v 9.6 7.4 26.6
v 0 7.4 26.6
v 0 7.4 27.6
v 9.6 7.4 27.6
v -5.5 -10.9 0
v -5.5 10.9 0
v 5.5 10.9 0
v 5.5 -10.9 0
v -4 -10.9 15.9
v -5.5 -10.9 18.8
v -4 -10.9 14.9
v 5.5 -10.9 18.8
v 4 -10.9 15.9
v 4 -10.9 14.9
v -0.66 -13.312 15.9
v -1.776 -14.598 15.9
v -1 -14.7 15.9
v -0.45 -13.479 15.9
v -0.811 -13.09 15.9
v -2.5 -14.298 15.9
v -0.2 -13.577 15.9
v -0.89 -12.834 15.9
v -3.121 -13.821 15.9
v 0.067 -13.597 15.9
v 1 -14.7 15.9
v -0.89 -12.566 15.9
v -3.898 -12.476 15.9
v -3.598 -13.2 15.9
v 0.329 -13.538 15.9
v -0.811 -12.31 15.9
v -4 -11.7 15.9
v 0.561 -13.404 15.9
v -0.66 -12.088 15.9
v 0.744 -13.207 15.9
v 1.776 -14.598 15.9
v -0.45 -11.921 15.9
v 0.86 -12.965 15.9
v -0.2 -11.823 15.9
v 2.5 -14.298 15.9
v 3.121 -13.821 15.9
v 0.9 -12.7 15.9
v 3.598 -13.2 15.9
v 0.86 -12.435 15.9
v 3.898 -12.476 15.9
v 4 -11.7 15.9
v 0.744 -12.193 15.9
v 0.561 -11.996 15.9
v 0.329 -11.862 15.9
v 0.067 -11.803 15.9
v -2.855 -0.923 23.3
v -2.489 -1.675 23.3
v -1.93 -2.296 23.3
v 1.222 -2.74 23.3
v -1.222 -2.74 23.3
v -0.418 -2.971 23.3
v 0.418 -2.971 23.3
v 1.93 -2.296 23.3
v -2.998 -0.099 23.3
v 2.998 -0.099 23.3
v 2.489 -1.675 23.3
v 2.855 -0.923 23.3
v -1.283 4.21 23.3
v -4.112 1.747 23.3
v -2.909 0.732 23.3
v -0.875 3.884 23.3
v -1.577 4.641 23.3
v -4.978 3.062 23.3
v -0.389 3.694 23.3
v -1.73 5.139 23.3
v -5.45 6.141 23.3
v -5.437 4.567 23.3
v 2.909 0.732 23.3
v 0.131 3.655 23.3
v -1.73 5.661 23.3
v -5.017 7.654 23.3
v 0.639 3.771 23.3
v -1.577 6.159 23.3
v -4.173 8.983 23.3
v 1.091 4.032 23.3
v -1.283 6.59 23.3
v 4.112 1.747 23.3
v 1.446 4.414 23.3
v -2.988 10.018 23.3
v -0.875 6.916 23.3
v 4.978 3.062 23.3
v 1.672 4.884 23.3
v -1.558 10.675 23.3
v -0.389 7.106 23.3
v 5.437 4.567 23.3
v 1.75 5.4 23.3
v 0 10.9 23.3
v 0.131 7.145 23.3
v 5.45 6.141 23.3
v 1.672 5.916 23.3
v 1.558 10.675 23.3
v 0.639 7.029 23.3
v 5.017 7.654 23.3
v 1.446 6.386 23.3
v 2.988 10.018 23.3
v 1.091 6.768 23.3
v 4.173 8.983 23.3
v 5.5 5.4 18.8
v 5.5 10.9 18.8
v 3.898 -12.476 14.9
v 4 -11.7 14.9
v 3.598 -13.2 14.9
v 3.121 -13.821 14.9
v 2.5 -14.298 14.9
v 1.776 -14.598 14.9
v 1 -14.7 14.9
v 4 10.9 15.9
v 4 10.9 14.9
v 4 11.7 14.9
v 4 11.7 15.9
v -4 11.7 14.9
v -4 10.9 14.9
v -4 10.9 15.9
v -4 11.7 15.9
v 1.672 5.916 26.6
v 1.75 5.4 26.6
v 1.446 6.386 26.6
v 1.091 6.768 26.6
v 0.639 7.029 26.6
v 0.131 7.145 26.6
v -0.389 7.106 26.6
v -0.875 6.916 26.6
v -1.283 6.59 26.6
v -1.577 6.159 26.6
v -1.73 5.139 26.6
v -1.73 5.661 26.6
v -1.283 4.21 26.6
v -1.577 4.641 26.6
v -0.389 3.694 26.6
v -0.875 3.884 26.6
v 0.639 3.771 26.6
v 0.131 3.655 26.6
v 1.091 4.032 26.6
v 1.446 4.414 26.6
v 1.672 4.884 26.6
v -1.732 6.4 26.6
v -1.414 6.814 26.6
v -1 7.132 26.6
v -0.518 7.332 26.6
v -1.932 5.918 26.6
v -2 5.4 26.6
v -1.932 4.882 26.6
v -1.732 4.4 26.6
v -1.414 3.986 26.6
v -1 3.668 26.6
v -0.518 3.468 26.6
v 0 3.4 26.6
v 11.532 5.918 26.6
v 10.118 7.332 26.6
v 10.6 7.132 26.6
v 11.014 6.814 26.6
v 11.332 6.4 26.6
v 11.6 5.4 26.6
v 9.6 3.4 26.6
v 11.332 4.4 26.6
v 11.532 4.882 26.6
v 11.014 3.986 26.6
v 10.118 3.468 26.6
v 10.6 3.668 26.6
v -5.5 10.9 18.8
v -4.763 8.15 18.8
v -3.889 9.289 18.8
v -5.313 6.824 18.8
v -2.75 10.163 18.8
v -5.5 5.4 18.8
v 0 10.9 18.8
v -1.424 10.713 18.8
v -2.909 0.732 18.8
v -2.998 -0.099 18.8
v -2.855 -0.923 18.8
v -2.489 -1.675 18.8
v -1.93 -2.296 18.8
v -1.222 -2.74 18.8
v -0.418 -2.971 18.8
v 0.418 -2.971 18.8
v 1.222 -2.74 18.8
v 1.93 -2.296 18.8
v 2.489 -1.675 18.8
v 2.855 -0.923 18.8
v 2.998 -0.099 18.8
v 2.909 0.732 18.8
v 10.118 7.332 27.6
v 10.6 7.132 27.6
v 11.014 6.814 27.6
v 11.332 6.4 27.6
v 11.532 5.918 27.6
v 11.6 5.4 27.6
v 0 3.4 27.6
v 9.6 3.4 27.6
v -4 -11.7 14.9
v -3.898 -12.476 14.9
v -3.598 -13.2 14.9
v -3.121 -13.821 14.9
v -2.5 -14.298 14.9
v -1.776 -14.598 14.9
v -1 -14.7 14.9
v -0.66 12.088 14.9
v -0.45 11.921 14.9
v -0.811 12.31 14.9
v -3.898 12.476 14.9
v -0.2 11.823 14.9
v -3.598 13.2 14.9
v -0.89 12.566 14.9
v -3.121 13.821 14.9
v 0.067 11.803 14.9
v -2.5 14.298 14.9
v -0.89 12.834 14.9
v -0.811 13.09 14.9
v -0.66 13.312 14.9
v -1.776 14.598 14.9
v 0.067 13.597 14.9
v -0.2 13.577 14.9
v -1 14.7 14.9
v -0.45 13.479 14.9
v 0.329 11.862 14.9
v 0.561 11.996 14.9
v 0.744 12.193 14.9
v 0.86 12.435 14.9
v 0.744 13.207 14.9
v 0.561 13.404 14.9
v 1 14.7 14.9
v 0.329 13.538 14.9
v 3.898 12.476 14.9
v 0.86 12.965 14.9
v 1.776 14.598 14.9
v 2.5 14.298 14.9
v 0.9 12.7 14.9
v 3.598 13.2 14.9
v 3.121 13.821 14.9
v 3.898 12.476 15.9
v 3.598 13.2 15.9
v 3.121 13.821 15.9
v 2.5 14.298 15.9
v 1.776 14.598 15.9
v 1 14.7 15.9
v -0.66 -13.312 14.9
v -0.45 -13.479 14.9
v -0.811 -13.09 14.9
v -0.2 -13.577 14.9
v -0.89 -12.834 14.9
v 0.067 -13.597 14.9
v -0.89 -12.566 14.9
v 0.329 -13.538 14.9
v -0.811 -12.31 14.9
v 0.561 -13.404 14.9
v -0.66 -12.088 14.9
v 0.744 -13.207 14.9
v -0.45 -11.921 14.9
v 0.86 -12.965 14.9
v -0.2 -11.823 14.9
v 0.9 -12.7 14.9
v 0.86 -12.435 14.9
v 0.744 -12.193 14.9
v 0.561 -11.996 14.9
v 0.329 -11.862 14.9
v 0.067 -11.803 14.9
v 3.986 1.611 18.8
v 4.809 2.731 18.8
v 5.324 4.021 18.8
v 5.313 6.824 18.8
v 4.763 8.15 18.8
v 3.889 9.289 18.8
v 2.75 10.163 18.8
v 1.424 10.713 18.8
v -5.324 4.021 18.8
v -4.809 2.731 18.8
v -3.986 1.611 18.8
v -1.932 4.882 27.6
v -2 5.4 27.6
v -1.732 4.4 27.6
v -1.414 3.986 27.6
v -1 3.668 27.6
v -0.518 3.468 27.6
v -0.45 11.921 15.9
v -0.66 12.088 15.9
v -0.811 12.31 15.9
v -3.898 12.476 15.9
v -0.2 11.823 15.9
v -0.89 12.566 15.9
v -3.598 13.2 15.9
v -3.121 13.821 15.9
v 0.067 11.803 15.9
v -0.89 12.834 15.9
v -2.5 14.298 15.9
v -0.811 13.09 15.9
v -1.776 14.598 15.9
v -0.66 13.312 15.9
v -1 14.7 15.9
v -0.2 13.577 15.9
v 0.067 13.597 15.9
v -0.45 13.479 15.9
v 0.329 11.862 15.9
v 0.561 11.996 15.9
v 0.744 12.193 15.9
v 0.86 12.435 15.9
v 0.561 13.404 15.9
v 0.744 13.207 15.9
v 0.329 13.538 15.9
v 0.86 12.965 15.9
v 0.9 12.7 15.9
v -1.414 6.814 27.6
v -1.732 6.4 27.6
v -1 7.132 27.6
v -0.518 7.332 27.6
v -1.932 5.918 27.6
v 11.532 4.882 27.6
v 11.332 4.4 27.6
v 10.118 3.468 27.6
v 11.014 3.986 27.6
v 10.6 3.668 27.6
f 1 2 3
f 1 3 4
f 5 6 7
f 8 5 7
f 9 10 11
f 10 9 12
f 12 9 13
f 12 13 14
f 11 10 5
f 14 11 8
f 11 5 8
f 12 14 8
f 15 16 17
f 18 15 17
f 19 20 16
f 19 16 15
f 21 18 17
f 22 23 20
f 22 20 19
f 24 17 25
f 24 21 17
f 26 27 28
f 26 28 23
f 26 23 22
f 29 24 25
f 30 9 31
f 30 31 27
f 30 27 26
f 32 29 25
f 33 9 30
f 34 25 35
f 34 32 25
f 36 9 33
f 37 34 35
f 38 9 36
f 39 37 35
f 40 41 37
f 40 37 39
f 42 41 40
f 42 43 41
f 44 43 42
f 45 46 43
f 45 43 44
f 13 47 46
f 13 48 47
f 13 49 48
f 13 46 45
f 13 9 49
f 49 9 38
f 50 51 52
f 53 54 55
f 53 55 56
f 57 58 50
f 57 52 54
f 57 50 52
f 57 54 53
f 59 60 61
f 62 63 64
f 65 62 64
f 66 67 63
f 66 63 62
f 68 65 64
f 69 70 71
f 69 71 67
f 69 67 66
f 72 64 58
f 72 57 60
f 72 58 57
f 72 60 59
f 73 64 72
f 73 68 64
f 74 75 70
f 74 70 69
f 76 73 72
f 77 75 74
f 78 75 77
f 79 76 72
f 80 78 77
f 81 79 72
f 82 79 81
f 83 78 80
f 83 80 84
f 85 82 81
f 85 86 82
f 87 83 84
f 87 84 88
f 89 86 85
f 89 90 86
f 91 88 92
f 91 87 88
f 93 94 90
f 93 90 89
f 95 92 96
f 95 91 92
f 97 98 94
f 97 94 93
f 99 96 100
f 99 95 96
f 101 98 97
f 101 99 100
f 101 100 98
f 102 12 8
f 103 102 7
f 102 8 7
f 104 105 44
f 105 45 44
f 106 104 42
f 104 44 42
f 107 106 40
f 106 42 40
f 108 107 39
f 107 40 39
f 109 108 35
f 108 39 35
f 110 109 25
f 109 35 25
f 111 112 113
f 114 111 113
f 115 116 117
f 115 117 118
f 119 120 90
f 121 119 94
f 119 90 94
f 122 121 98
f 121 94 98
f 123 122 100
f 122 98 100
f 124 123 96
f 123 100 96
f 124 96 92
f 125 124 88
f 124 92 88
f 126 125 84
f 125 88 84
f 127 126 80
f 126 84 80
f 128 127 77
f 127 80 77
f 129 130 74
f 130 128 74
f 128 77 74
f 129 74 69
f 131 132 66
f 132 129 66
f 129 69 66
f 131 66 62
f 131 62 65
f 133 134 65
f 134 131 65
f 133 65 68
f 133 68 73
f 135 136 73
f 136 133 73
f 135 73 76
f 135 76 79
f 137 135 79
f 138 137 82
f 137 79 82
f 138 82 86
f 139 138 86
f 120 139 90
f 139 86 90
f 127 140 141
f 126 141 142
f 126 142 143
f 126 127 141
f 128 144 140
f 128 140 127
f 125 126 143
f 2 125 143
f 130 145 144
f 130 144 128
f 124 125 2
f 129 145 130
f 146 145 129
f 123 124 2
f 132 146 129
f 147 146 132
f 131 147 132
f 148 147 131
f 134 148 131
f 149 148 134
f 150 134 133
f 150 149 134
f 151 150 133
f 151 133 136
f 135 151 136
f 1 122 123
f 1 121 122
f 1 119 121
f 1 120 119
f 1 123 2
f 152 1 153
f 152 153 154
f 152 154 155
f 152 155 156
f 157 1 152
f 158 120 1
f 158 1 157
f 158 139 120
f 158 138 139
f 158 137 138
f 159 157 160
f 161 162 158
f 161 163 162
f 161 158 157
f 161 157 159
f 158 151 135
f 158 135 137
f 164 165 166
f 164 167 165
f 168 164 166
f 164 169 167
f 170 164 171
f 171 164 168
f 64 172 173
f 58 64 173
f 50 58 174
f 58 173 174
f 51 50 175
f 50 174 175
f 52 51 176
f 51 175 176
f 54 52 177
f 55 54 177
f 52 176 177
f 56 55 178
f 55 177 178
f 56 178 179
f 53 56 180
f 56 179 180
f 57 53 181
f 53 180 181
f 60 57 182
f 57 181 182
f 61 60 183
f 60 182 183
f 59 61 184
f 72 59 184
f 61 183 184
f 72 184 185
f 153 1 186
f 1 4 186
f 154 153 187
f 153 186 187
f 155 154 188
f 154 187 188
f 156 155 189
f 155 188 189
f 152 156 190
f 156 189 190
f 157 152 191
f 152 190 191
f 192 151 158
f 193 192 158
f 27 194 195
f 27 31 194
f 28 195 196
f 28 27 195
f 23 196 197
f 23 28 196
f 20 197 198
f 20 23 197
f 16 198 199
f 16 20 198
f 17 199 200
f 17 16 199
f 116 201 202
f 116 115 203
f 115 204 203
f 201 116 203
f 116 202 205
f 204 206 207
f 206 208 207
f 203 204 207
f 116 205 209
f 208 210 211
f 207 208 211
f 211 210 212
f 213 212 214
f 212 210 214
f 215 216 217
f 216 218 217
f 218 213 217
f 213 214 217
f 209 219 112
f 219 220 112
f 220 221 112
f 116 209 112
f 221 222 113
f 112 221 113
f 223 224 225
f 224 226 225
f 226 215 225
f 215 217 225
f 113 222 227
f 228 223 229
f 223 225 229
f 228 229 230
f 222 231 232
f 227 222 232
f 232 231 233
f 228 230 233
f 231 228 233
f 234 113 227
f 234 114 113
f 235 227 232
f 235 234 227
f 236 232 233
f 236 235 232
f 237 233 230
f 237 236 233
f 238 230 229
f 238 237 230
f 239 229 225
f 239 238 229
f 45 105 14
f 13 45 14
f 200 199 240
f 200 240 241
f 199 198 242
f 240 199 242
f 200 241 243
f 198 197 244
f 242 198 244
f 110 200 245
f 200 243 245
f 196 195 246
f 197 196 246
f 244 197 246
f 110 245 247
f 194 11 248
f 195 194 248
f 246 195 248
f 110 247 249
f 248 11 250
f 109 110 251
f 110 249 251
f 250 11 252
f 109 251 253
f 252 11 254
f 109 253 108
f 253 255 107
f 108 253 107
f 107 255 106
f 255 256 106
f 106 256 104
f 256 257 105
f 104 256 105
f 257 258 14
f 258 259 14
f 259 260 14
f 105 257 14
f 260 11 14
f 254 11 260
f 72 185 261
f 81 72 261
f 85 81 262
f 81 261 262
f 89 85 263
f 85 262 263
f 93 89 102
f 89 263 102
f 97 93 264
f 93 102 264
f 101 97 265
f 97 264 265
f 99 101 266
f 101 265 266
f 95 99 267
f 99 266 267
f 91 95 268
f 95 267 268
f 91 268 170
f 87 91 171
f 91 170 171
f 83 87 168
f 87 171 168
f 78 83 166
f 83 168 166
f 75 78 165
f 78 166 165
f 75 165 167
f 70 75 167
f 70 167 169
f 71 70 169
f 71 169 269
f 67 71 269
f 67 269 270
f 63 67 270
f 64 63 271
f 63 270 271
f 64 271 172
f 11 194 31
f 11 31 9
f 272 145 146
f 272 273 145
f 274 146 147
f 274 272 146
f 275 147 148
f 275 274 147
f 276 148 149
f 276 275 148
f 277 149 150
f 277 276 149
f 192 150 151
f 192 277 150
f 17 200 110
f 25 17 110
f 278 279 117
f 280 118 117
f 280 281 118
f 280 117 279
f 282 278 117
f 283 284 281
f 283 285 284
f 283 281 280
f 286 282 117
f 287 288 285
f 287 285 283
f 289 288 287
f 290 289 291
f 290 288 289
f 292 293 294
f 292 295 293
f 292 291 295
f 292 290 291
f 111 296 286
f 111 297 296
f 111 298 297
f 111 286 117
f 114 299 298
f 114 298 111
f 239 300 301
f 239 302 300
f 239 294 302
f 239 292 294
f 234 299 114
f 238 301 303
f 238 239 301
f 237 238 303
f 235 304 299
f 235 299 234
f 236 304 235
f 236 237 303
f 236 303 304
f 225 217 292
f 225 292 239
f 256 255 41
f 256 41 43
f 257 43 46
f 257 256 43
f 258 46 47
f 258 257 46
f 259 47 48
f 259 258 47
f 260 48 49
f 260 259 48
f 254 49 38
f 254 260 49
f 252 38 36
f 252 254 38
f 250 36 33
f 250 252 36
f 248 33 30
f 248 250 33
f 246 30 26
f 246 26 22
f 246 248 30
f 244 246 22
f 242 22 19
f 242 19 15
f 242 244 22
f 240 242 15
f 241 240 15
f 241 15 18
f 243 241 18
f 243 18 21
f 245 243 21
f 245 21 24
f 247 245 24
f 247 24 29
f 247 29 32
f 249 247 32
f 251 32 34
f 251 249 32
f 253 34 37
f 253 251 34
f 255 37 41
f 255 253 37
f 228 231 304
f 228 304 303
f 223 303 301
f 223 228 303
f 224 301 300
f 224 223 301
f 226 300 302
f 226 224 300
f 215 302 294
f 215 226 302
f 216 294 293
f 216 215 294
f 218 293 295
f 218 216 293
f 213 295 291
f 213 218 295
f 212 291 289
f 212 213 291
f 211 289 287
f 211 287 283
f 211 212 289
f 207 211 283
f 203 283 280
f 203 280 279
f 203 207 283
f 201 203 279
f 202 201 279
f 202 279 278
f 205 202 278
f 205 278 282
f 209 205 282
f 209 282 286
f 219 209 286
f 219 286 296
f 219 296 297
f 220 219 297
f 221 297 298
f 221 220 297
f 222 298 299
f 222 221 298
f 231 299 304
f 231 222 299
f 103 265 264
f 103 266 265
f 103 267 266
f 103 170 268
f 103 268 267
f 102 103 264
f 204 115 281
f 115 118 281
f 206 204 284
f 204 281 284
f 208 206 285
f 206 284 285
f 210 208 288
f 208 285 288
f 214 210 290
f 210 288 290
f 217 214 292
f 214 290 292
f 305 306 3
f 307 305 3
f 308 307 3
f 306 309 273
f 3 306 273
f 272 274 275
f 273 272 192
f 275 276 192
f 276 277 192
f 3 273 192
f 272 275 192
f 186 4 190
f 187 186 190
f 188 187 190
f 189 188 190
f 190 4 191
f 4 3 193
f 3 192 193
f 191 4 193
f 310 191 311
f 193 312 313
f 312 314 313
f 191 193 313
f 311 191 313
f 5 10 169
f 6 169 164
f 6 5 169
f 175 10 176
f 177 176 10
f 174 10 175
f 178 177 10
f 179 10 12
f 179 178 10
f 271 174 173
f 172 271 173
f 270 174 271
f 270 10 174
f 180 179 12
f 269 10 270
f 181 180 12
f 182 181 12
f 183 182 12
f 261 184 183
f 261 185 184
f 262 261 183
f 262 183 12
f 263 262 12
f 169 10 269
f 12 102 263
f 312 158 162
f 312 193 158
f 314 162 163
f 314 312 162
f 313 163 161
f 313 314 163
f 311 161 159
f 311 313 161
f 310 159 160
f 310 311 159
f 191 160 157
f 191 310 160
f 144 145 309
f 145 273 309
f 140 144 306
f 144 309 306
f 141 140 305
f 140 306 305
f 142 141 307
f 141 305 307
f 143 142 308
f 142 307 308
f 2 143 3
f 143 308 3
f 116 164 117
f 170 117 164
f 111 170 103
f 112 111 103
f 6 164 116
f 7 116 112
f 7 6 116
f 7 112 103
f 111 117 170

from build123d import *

# Parameters (mm, degrees)
F0_W      = 11
F0_H      = 21.8
F1_DEPTH  = 18.8
F3_W      = 8
F3_H      = 3.8
F3_R      = 0.9
F4_DEPTH  = 1
F6_DEPTH  = 4.5
F7_R      = 1.75
F8_DEPTH  = 3.5
F10_W     = 13.6
F10_H     = 4
F11_DEPTH = 1
F12_R     = 1.99999
F13_R     = 3


# Not quite as in the source:
# - a fillet or chamfer is up to 0.001 mm smaller than in the source, because OpenCascade refuses the exact size


with BuildPart() as f1:
    # F0 (on Top) → F1 (new body)
    with BuildSketch(Plane.XY):
        Rectangle(F0_W, F0_H)
    extrude(amount=F1_DEPTH)

    # F3 (on offset) → F4 (join)
    with BuildSketch(Plane.XY.offset(14.9)):
        with Locations((0, 12.8)):
            Rectangle(F3_W, F3_H)
        with Locations((0, 12.7)):
            Circle(F3_R, mode=Mode.SUBTRACT)
        with Locations((0, -12.8)):
            Rectangle(F3_W, F3_H)
        with Locations((0, -12.7)):
            Circle(F3_R, mode=Mode.SUBTRACT)
    extrude(amount=F4_DEPTH)

    # F5 (on face) → F6 (join)
    with BuildSketch(Plane.XY.offset(18.8)):
        with BuildLine():
            ThreePointArc((-2.9092231591, 0.7324074074), (0, -3), (2.9092231591, 0.7324074074))
            ThreePointArc((2.9092231591, 0.7324074074), (0, 10.9), (-2.9092231591, 0.7324074074))
        make_face()
    extrude(amount=F6_DEPTH)

    # F7 (on face) → F8 (join)
    with BuildSketch(Plane.XY.offset(23.3)):
        with Locations((0, 5.4)):
            Circle(F7_R)
    extrude(amount=F8_DEPTH)

    # F10 (on offset) → F11 (join)
    with BuildSketch(Plane(origin=(0, 0, 26.6), x_dir=(1, 0, 0), z_dir=(0, 0, -1))):
        with Locations((4.8, -5.4)):
            Rectangle(F10_W, F10_H)
    extrude(amount=-F11_DEPTH)

    # F12 (radius 2 in the source; OpenCascade refuses exactly that, so slightly less here)
    f12_edges = [f1.edges().sort_by_distance(p)[0] for p in [
        (11.6, 3.4, 27.1),
        (11.6, 7.4, 27.1),
        (-2, 7.4, 27.1),
        (-2, 3.4, 27.1),
    ]]
    fillet(f12_edges, radius=F12_R)

    # F13
    f13_edges = [f1.edges().sort_by_distance(p)[0] for p in [
        (-4, -14.7, 15.4),
        (4, -14.7, 15.4),
        (4, 14.7, 15.4),
        (-4, 14.7, 15.4),
    ]]
    fillet(f13_edges, radius=F13_R)


solid = f1.part
